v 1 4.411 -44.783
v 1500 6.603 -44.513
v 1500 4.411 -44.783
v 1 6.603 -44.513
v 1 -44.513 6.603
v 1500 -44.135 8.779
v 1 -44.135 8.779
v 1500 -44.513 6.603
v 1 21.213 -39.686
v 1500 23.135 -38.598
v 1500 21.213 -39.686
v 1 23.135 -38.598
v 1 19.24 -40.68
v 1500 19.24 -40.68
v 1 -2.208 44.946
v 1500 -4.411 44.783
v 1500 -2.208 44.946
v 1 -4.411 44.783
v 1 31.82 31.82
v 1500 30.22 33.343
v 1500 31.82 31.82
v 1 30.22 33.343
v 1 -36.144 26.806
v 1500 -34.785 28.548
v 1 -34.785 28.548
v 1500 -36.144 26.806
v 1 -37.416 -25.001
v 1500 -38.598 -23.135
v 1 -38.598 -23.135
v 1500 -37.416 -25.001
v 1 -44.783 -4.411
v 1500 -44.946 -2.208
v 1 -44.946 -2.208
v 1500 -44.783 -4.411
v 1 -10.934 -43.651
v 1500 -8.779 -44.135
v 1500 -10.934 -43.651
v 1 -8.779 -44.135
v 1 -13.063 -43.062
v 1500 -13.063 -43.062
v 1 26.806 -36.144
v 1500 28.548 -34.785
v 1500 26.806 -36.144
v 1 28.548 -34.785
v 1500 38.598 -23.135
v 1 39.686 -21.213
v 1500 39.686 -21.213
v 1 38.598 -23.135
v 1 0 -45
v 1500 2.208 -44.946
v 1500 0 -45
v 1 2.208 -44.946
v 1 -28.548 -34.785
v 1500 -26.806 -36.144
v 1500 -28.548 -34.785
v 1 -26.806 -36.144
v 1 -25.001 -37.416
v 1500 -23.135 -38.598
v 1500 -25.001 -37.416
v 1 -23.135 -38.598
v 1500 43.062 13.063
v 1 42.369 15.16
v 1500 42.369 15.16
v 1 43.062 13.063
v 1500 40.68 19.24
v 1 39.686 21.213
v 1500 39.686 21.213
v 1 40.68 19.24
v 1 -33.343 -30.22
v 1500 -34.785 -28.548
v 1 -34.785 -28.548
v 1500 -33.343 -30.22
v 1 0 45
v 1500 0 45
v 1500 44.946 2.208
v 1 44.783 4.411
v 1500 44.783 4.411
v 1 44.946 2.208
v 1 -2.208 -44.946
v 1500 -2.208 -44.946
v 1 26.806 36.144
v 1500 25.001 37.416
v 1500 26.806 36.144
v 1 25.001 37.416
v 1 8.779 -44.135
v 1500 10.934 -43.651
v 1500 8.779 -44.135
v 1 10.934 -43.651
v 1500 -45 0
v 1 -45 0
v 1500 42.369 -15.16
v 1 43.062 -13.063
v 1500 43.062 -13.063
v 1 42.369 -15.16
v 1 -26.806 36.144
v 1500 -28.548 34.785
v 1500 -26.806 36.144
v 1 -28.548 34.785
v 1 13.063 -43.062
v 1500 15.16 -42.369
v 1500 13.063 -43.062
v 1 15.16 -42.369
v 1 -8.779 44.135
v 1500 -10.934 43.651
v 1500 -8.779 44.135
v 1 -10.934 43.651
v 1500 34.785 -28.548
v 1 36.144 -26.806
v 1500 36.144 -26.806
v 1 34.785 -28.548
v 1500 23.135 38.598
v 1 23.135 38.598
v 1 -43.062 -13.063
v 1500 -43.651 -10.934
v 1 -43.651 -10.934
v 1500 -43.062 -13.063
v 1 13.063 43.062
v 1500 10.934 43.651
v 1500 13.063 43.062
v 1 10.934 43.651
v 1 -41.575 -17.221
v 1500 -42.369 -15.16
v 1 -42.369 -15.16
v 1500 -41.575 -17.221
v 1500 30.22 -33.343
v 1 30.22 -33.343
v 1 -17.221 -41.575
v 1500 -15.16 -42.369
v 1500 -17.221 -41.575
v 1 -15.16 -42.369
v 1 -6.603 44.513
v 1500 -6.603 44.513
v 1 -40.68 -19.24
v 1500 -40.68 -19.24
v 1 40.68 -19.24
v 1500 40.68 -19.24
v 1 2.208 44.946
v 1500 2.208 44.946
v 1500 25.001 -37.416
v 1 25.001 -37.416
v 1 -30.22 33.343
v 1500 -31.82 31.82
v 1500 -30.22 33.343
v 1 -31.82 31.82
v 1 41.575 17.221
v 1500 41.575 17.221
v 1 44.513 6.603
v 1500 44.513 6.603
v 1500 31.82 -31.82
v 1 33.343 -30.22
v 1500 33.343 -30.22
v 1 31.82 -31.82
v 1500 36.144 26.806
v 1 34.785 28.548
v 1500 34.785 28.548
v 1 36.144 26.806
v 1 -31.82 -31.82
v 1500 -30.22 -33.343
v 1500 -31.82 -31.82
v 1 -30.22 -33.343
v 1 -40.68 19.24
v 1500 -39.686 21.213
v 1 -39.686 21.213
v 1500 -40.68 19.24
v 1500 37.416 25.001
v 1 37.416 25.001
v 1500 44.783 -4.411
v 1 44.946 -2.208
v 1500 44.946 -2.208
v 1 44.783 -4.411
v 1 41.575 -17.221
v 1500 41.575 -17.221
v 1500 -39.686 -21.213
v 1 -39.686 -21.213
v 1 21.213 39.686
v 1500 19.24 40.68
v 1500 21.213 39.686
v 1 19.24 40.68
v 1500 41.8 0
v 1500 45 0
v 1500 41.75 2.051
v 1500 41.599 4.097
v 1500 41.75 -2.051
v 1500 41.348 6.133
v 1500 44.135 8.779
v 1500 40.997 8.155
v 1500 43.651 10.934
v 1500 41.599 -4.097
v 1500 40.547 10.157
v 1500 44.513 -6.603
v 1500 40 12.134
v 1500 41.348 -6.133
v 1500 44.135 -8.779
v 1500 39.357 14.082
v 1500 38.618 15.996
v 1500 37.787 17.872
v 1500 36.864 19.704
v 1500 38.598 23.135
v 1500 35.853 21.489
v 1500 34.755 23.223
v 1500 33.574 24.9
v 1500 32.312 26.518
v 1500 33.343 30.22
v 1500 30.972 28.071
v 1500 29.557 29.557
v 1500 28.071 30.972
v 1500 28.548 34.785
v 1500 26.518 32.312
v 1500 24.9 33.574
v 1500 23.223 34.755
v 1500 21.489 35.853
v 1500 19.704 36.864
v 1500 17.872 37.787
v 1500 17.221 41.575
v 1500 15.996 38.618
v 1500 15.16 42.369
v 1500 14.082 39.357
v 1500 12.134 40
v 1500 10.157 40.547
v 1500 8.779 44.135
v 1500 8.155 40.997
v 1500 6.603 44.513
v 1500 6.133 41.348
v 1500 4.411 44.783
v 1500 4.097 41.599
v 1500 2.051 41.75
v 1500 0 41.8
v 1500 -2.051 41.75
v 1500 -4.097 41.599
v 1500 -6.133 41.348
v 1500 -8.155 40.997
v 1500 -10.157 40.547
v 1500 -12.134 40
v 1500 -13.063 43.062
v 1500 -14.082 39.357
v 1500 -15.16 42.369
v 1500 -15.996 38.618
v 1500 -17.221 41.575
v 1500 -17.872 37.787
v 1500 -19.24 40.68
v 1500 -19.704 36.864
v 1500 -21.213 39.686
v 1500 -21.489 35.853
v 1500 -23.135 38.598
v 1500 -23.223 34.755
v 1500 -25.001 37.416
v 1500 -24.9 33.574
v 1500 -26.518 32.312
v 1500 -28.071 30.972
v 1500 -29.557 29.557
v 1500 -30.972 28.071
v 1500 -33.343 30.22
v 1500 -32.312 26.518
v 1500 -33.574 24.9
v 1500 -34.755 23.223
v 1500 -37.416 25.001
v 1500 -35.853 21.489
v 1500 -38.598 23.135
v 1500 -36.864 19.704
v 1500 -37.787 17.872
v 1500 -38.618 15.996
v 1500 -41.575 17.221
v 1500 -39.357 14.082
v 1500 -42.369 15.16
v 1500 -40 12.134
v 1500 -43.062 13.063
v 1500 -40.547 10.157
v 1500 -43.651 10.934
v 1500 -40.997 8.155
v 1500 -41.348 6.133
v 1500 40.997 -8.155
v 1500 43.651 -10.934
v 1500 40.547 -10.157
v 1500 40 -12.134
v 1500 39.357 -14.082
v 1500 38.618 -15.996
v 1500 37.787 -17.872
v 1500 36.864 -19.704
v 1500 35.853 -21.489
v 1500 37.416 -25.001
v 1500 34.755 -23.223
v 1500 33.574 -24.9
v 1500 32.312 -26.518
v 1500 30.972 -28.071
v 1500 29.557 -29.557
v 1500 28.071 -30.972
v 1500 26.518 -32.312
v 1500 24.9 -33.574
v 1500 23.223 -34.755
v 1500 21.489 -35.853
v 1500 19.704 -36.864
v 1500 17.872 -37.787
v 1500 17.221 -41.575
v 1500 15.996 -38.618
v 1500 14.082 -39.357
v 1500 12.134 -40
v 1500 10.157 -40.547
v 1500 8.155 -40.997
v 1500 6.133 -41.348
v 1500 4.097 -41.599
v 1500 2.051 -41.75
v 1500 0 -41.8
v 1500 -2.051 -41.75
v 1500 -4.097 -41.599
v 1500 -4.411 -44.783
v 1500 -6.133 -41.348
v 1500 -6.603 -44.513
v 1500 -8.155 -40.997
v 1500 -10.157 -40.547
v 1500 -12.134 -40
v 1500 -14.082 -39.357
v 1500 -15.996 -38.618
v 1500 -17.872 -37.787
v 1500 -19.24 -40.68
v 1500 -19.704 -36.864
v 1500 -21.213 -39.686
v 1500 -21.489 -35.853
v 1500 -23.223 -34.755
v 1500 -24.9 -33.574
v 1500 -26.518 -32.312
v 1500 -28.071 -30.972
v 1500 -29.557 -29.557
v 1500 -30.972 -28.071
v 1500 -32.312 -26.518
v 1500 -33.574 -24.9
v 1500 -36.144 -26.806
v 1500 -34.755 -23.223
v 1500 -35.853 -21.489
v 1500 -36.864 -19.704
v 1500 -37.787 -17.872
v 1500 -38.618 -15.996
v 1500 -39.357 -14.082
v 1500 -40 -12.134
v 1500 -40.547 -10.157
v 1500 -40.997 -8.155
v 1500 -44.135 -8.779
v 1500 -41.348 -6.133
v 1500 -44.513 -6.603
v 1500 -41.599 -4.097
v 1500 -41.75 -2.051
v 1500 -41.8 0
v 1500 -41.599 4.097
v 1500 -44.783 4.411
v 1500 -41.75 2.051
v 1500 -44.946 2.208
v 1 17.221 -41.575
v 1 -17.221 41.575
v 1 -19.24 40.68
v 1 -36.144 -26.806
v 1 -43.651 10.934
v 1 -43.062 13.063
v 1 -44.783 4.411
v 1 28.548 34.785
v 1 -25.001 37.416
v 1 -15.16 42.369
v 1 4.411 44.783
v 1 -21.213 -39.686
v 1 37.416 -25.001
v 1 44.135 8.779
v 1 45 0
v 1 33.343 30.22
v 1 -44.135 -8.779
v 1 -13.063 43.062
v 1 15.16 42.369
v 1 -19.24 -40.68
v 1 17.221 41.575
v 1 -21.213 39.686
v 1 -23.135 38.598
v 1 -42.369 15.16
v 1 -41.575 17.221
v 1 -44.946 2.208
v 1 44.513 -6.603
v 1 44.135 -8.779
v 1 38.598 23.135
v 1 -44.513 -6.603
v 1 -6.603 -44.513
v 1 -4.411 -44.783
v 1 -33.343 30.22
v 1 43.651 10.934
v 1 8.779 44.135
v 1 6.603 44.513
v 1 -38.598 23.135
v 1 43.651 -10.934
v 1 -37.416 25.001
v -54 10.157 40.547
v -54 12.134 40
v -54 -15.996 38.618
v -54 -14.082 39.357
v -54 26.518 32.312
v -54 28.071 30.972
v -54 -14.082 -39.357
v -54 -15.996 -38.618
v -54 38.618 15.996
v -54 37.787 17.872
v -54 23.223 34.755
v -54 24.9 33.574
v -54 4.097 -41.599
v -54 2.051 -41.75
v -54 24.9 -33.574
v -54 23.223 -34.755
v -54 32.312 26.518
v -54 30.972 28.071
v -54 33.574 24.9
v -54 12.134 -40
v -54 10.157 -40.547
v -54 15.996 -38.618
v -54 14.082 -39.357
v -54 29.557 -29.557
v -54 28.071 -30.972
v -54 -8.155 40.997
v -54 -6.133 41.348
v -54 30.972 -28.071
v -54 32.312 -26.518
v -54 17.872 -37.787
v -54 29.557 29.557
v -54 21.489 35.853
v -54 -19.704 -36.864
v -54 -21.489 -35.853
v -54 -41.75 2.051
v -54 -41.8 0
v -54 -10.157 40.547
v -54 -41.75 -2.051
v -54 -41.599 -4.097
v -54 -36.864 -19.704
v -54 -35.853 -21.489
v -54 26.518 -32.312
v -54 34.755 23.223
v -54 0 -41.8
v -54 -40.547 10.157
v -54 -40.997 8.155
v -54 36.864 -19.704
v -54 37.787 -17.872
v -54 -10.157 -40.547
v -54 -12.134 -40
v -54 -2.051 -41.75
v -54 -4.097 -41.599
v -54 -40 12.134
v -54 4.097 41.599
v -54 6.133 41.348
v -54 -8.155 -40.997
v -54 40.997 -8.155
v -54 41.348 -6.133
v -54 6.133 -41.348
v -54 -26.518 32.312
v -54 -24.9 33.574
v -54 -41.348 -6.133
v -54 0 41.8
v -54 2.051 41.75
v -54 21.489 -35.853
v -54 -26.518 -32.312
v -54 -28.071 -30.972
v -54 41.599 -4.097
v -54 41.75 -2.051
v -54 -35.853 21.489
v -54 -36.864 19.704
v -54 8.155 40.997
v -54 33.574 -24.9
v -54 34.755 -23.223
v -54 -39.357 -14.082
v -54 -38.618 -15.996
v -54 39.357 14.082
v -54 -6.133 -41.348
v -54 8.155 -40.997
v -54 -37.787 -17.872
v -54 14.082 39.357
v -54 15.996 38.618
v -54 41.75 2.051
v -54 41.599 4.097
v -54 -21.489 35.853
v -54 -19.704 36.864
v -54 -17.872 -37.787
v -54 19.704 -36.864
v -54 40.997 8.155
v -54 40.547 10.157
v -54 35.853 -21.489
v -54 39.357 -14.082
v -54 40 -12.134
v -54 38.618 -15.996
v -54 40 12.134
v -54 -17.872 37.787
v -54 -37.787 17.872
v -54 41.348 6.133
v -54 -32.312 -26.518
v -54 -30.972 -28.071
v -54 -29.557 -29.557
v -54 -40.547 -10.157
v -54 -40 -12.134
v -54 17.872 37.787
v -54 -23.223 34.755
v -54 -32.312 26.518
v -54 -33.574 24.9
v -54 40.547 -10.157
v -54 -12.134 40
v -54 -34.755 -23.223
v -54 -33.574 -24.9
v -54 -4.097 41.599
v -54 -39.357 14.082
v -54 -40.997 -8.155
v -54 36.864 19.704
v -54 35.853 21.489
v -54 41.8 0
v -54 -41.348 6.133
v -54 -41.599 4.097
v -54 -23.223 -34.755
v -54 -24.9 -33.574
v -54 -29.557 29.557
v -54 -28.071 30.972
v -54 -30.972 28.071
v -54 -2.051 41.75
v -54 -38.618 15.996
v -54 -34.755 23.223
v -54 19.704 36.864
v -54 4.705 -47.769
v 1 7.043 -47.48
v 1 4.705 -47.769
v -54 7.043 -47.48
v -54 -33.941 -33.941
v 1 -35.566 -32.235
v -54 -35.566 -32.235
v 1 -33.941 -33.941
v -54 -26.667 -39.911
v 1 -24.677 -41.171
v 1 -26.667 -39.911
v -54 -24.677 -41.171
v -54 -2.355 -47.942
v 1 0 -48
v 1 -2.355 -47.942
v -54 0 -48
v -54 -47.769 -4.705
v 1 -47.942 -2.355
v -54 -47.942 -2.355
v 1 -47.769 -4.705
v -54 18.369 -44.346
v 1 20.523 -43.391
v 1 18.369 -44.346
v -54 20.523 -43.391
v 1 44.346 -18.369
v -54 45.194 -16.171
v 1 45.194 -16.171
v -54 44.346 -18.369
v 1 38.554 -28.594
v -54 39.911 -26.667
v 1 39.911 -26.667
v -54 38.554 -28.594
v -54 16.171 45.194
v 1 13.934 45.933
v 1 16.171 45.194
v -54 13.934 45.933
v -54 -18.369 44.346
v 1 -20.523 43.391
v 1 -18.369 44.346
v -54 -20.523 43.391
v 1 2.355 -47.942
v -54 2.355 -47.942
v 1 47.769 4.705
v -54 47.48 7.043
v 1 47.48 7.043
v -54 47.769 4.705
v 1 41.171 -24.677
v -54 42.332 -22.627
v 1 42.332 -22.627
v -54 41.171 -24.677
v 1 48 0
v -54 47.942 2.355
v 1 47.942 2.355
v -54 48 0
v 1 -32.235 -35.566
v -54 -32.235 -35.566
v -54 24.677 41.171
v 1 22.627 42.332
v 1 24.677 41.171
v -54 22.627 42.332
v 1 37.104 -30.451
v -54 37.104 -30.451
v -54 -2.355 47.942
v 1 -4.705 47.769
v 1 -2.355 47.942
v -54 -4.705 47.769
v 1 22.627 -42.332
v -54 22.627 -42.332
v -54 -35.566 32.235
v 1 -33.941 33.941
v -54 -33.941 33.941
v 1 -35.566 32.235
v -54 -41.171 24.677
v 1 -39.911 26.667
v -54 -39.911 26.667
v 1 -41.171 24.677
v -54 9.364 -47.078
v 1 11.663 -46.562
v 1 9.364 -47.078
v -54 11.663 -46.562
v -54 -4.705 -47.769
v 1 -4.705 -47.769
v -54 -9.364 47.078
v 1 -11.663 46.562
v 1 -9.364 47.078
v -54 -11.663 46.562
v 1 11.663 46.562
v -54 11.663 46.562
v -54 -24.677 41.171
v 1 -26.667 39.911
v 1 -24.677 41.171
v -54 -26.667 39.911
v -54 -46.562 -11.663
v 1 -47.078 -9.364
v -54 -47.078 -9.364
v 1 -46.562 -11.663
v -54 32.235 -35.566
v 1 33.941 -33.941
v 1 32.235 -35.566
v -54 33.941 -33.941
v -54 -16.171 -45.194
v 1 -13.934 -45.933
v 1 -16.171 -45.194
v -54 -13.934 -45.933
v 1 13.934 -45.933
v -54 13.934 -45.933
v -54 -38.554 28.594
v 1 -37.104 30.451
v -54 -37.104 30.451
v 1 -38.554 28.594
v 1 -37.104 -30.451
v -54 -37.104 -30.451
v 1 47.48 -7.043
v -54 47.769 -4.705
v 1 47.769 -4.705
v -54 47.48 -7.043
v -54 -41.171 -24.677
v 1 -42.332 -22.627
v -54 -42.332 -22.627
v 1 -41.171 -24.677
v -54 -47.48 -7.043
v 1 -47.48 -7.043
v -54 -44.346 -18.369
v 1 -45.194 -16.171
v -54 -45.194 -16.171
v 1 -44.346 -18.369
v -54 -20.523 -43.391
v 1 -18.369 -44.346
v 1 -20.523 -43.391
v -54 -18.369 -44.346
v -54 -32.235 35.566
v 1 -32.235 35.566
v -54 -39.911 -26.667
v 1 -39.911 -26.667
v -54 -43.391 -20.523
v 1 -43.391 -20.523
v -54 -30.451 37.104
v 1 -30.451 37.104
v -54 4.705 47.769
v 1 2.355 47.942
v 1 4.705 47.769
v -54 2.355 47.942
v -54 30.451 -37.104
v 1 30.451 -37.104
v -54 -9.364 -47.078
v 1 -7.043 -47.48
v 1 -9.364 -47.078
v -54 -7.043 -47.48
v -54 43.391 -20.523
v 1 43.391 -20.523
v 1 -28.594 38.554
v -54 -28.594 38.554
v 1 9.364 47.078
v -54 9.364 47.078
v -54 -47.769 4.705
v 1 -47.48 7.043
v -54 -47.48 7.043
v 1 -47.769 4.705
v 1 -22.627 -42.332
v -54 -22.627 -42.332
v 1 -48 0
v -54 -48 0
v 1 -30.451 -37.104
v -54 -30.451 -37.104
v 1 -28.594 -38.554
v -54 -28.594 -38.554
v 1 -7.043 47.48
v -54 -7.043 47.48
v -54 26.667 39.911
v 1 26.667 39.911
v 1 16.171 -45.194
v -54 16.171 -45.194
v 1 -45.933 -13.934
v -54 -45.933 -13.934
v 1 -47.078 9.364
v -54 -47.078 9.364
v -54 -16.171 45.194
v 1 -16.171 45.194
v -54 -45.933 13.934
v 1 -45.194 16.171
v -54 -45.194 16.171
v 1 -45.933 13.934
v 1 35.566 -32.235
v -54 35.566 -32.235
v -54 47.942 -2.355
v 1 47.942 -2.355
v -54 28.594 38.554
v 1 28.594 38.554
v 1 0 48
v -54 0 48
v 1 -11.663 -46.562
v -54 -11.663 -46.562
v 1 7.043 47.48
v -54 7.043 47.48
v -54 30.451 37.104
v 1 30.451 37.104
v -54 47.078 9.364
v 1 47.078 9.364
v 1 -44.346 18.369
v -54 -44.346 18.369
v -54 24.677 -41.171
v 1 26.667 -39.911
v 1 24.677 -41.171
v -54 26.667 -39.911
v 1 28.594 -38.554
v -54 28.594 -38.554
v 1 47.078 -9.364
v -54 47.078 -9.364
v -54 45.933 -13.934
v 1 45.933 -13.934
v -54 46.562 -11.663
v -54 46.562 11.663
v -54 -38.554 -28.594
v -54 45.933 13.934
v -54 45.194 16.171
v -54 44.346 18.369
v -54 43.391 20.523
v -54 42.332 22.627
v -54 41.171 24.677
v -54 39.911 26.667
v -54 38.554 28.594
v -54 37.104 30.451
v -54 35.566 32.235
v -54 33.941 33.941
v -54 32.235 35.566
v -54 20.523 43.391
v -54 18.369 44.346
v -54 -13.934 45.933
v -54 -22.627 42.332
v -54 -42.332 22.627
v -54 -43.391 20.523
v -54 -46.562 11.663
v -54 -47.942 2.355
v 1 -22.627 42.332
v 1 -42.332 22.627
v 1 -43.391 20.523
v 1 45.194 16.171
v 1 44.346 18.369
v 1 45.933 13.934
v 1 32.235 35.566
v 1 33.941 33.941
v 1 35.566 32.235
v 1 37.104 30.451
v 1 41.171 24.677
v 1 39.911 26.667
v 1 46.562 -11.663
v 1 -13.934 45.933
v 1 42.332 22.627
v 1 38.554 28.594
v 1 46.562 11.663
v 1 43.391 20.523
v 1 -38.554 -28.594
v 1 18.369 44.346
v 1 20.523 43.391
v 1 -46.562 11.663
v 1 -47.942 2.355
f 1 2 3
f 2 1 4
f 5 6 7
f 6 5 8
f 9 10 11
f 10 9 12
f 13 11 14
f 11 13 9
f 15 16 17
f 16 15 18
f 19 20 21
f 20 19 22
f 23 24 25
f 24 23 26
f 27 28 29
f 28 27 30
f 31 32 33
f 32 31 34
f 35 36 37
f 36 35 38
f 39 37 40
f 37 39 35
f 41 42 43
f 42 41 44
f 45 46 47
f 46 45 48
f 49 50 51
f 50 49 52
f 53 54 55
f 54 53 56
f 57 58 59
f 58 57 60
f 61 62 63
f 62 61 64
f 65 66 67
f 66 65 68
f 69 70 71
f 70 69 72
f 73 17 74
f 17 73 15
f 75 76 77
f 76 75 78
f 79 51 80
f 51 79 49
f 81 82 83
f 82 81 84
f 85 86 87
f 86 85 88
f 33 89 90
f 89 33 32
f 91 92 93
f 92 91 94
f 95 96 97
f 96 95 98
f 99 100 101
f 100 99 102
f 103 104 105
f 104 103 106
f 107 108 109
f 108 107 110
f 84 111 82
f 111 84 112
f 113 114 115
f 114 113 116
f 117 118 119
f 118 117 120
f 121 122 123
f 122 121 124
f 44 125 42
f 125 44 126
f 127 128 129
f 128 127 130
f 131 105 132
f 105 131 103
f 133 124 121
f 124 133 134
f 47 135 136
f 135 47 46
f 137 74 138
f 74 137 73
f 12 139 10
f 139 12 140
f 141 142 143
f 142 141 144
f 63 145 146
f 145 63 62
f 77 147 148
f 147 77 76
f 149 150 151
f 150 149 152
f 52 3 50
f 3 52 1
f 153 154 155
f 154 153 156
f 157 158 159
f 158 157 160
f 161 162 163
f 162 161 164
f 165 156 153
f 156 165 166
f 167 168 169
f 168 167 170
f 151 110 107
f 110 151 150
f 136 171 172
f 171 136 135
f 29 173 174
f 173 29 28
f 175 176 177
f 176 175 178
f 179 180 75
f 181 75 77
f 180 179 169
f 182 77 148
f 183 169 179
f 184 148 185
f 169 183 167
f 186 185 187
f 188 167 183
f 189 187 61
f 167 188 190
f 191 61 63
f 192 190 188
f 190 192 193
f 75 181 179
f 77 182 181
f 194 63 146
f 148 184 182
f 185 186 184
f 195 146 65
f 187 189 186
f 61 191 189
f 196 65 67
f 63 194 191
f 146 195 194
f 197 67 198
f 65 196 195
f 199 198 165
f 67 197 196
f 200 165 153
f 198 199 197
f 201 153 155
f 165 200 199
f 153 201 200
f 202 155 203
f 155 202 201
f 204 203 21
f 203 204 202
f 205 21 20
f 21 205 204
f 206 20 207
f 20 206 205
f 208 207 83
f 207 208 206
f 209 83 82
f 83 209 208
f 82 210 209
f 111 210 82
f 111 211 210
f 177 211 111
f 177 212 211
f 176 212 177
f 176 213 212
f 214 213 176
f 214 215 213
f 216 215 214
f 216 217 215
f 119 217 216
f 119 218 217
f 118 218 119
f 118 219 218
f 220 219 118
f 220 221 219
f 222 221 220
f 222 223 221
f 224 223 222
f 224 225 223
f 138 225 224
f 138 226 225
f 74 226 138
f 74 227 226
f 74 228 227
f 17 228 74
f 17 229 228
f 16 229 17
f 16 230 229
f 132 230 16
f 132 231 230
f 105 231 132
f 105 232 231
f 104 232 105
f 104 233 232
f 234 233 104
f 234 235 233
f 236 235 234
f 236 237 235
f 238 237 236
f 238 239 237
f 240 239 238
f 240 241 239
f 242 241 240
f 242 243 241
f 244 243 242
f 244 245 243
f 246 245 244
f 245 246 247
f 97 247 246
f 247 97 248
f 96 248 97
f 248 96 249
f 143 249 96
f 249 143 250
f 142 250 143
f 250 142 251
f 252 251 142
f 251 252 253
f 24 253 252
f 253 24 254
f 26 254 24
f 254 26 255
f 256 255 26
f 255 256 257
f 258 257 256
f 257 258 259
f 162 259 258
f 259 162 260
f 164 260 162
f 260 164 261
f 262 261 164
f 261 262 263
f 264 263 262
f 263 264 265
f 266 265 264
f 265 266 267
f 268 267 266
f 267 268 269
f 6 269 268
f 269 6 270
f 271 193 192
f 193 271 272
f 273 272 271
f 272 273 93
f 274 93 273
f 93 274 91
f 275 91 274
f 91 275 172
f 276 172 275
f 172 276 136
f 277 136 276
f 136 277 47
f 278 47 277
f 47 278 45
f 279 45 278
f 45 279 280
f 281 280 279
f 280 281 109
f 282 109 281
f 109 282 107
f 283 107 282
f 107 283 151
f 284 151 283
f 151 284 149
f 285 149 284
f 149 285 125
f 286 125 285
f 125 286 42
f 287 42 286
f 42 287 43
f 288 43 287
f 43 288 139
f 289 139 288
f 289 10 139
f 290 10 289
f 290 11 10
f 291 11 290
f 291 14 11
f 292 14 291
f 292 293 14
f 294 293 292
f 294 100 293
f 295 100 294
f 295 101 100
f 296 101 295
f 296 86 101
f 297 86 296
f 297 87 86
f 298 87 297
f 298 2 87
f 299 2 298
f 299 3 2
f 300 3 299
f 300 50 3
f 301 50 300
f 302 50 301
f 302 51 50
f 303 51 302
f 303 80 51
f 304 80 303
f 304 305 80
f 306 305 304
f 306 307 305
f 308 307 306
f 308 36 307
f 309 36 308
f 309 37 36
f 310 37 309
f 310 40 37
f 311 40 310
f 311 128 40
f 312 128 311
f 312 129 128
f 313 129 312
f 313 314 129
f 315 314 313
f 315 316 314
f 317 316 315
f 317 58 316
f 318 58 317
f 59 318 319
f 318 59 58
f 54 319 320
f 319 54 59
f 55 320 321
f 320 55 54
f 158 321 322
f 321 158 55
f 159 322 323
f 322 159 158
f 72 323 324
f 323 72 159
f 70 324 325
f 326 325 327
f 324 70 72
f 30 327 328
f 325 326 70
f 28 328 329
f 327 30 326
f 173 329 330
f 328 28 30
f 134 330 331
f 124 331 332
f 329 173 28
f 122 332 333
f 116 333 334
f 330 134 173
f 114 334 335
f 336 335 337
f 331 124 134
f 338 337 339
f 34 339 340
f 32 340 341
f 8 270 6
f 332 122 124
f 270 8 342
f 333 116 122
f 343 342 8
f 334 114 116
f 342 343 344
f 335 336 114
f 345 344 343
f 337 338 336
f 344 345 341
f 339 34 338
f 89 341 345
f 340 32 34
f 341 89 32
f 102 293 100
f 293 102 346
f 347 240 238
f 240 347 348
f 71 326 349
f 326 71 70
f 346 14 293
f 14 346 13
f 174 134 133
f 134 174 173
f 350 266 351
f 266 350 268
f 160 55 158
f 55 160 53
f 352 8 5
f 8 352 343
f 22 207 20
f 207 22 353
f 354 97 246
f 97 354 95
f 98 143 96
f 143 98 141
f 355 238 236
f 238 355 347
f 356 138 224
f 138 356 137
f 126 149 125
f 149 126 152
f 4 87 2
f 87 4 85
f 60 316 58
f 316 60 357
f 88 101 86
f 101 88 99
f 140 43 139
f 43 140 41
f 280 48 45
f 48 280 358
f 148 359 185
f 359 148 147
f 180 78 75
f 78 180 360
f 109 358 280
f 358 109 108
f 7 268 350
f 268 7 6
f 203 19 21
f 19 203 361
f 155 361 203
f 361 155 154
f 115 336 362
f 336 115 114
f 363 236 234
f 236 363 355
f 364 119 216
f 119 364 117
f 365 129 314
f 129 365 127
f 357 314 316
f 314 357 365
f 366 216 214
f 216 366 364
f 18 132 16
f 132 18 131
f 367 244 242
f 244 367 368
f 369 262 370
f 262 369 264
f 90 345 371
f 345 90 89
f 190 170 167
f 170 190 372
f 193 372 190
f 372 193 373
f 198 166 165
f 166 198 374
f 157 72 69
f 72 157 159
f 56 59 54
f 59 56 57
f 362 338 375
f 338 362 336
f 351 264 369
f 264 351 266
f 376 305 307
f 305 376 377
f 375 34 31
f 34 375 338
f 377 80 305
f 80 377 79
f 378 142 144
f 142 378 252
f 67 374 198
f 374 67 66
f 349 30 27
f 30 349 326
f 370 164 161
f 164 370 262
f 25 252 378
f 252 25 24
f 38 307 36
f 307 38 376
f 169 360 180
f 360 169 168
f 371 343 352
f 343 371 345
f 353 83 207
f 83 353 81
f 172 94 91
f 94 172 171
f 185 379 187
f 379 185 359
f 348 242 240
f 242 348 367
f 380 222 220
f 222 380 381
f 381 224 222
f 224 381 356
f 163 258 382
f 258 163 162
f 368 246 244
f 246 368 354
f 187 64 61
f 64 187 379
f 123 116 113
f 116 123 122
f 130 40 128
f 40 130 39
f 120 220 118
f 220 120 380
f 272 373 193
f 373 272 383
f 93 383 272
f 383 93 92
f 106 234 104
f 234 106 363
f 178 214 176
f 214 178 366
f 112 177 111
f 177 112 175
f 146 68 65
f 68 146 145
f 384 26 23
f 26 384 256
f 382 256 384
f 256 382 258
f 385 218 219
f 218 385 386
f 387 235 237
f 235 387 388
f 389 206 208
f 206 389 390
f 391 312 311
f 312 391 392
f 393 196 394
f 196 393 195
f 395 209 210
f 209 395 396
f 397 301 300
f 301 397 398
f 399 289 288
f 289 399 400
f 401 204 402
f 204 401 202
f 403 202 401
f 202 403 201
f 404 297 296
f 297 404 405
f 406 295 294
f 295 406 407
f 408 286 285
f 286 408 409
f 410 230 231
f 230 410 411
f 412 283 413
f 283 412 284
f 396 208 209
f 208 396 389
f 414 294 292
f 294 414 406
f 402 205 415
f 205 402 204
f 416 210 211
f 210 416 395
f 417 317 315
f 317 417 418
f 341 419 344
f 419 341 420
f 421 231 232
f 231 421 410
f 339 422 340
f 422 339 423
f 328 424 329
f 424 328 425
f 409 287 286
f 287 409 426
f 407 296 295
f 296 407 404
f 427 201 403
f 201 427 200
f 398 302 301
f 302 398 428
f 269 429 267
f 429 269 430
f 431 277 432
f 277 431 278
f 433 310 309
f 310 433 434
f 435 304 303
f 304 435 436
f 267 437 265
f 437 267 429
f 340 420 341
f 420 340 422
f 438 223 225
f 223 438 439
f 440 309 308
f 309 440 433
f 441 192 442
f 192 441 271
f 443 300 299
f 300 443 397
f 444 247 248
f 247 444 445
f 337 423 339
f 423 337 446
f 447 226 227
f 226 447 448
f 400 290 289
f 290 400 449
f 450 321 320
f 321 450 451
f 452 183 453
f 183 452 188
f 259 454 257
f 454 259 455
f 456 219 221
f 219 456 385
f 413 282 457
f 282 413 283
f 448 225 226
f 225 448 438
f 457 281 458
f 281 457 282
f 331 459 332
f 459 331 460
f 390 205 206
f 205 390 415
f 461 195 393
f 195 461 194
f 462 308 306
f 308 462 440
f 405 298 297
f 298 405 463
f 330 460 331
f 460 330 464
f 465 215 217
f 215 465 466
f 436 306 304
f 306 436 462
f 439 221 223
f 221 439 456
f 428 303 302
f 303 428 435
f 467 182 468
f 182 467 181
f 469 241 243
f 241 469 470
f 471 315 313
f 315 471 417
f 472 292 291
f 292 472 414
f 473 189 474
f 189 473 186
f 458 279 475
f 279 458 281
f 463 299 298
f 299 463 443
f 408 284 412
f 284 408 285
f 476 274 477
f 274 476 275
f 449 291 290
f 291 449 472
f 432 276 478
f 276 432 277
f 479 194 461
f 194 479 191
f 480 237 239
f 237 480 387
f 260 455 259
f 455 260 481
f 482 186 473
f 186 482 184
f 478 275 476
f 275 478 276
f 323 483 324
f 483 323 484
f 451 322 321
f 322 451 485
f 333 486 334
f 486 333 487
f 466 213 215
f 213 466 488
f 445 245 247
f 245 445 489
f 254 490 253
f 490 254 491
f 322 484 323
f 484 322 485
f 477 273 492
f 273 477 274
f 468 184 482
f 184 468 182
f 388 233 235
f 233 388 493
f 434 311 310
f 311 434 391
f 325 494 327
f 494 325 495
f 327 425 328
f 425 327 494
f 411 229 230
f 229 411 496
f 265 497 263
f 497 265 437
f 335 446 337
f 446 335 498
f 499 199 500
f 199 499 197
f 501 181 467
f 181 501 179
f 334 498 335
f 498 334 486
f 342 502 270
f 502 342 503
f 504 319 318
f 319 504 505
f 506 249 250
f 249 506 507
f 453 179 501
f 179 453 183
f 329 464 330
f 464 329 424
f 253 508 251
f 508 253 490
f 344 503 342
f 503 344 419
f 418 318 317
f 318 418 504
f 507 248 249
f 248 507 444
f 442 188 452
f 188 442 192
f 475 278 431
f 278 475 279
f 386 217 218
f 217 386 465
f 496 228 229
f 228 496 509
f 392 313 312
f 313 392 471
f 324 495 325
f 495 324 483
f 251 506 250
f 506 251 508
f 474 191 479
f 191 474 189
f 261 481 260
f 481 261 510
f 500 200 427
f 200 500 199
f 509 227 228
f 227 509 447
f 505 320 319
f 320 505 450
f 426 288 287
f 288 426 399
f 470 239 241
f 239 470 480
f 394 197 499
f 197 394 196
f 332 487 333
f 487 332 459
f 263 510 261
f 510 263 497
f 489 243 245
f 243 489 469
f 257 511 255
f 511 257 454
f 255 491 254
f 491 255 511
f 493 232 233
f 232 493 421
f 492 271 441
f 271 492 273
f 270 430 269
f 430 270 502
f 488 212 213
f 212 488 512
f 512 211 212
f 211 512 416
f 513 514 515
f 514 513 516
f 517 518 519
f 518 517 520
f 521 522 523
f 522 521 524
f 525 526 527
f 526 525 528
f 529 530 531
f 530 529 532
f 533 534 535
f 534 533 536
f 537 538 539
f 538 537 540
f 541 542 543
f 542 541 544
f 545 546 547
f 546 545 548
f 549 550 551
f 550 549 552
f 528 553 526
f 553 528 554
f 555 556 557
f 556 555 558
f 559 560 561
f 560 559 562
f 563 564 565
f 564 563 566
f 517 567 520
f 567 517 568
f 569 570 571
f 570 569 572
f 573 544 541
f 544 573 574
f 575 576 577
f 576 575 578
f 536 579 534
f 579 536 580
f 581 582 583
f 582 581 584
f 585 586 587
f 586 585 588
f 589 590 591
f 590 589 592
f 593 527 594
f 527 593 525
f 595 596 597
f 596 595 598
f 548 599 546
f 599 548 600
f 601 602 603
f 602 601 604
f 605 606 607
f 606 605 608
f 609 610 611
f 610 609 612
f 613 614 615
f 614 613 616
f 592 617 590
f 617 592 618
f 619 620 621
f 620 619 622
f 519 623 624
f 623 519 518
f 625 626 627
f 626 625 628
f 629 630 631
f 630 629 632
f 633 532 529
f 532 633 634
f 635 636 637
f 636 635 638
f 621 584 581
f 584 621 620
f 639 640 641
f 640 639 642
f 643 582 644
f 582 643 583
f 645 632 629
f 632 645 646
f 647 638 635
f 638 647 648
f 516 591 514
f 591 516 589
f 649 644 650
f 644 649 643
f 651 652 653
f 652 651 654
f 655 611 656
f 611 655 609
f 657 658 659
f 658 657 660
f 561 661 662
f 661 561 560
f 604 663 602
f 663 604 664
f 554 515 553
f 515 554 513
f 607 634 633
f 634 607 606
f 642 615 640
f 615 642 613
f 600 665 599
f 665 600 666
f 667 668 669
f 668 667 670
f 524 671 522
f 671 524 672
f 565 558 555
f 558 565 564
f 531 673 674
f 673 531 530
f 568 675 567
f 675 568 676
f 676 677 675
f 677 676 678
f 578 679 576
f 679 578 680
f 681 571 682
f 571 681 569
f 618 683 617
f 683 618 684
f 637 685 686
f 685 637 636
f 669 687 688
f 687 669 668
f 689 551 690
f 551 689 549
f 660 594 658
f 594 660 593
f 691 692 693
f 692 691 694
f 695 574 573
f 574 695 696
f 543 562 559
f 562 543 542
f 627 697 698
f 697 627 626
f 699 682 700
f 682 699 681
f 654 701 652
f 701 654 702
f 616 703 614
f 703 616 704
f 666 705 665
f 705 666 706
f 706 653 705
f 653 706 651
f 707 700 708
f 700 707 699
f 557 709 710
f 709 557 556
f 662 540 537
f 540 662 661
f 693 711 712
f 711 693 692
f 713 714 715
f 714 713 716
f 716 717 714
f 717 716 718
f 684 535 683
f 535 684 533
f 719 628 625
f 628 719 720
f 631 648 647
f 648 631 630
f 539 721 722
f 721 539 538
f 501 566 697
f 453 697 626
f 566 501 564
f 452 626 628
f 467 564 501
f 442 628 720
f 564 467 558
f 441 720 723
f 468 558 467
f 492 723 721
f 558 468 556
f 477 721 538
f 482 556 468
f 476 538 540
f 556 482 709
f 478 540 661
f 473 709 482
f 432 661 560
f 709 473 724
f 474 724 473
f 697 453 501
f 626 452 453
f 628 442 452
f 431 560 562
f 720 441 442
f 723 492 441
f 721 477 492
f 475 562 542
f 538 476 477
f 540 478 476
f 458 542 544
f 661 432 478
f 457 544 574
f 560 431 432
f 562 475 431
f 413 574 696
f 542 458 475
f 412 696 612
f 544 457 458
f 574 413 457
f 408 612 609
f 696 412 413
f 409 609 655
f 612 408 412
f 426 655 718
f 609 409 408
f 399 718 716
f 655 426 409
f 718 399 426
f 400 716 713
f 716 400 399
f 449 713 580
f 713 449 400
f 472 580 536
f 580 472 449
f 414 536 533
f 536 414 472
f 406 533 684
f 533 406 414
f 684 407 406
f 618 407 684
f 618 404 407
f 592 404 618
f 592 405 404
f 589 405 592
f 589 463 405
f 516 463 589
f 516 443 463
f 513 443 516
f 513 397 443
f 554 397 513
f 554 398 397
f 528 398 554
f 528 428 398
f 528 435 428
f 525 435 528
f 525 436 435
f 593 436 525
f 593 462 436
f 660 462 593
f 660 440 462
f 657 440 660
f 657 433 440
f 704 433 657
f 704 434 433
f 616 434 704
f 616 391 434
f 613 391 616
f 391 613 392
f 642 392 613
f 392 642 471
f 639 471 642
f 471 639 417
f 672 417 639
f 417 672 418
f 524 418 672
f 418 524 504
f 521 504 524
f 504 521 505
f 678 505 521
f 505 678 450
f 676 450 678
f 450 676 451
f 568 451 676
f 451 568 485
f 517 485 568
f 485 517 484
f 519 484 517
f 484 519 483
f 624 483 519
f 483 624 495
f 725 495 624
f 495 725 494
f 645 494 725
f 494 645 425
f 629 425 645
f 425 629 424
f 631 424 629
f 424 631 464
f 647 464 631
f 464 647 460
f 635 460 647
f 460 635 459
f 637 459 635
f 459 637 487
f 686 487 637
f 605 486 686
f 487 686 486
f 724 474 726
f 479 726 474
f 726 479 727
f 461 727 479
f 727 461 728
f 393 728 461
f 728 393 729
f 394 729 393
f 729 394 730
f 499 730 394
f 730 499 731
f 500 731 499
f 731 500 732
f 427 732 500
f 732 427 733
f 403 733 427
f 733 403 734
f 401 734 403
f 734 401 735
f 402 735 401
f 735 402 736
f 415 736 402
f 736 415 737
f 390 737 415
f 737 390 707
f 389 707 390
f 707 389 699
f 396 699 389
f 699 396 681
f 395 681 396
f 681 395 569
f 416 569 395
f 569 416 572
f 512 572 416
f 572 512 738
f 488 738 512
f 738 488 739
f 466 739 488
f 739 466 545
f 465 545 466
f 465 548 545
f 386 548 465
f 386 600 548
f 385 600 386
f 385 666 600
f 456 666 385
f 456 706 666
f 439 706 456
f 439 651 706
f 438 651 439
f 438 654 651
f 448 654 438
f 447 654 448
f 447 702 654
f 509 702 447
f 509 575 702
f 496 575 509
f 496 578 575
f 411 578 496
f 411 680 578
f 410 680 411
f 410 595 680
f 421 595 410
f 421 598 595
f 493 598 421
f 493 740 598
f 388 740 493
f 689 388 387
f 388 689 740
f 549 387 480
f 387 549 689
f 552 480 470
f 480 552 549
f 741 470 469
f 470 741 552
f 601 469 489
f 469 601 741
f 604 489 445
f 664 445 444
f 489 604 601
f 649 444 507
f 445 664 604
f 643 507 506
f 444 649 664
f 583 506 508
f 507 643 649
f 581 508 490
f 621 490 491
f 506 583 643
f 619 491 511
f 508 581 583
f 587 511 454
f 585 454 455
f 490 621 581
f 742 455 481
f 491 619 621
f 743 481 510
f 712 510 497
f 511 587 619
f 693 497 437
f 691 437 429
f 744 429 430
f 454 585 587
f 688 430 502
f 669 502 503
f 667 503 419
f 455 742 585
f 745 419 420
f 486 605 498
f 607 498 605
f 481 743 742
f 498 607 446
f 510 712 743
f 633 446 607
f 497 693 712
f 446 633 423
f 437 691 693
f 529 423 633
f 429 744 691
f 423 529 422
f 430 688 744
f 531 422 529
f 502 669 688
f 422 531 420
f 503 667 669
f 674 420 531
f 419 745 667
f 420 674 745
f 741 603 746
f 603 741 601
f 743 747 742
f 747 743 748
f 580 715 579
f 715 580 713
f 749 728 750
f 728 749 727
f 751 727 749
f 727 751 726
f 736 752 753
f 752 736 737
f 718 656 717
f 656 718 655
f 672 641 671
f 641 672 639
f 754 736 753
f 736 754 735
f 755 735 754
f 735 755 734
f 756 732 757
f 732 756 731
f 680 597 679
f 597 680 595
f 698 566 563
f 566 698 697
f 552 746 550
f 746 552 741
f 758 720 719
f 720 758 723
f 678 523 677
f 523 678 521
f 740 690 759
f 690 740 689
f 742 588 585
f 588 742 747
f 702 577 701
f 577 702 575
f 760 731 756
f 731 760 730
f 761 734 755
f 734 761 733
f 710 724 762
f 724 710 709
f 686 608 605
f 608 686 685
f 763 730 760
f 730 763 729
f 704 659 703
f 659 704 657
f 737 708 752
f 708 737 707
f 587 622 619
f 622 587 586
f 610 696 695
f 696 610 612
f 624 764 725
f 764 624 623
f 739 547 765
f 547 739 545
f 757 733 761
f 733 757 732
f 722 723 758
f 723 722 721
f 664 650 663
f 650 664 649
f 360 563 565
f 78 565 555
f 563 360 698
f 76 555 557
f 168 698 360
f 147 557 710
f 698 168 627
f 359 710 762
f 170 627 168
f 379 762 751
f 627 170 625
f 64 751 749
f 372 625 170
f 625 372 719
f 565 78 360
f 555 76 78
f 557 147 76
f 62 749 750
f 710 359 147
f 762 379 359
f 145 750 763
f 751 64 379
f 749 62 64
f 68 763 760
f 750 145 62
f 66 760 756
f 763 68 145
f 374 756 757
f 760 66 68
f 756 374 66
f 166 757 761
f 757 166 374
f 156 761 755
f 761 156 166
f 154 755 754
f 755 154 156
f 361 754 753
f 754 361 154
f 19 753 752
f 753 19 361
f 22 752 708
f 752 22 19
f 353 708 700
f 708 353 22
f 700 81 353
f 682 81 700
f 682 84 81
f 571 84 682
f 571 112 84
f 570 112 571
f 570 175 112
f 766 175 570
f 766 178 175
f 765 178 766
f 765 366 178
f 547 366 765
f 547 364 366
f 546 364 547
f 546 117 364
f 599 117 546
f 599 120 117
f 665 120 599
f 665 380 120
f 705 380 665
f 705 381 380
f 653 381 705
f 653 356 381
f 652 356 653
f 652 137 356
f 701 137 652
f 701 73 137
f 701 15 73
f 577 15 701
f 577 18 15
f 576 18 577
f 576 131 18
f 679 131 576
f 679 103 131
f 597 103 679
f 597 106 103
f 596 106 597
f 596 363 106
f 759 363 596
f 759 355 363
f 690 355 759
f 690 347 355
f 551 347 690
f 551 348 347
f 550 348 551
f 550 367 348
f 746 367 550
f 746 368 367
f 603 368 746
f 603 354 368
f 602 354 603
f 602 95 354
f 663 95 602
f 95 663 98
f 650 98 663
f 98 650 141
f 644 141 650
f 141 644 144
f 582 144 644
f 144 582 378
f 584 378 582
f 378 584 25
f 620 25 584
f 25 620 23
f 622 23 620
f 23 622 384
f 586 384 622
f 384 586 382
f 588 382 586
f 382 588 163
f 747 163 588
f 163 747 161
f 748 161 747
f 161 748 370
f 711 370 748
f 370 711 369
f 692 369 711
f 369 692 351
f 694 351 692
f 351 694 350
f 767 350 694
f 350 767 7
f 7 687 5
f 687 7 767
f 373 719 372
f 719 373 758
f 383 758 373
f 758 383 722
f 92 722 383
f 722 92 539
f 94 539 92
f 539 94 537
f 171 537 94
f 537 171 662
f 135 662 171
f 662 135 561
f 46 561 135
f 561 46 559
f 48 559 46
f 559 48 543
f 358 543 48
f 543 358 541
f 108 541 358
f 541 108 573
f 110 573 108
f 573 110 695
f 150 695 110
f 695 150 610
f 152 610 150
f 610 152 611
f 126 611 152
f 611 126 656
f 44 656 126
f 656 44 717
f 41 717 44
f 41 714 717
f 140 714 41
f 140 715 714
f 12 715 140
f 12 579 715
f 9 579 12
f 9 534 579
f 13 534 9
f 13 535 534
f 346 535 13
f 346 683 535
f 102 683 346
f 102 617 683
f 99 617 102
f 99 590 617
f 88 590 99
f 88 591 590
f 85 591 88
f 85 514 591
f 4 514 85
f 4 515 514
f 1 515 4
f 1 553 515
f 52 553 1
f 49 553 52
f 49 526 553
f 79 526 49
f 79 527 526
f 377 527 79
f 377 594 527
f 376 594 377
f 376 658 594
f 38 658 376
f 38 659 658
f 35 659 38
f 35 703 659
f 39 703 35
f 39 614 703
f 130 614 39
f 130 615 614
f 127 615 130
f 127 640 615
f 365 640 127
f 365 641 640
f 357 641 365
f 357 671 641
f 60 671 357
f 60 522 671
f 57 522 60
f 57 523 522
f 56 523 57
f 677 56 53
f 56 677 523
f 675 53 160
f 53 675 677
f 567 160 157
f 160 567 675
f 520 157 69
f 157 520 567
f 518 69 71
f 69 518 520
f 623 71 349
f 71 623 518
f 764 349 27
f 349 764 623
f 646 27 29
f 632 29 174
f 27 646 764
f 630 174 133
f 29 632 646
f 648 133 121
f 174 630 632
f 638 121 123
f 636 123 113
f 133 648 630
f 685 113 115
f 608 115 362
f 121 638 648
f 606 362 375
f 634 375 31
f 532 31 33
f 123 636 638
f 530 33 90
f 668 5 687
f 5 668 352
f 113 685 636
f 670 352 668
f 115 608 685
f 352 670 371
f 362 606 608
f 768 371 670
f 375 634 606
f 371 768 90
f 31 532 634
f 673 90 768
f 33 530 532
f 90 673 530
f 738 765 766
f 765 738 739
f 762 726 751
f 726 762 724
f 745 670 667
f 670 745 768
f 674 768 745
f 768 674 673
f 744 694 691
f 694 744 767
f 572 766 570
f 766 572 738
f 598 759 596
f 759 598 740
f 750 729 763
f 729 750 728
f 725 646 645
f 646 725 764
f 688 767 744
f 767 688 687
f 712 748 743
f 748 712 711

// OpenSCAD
$fn = 128;

// Parameters (HT straight pipe)
nominal_diameter_mm = 90; //[45:180:1]
length_mm = 1500; //[750:3000:10]          // total straight length
pipe_wall_mm = 3.2; //[1.6:6.4:0.1]

// Optional socket end fitting(s)
include_end_fitting = 1; //[0:1:1]
end_fitting_count = 1; //[0:2:1]           // 0,1,2 sockets
fitting_length_mm = 55; //[30:110:1]
fitting_over_od_mm = 6; //[3:12:0.5]
fitting_overlap_mm = 1; //[0.5:2:0.1]

// Derived radii
od_r = nominal_diameter_mm/2;
id_r = max(0.01, od_r - pipe_wall_mm);

socket_od_r = od_r + fitting_over_od_mm/2;
socket_id_r = id_r;

// Small overlap to guarantee manifold unions
eps = 0.5;

// Straight hollow pipe along +X, starting at x=0
module straight_pipe_x(len, outer_r, inner_r) {
    difference() {
        translate([len/2, 0, 0]) rotate([0,90,0]) cylinder(h=len, r=outer_r, center=true);
        translate([len/2, 0, 0]) rotate([0,90,0]) cylinder(h=len + 2*eps, r=inner_r, center=true);
    }
}

// Socket along +X, starting at x=0
module socket_x(len, outer_r, inner_r) {
    difference() {
        translate([len/2, 0, 0]) rotate([0,90,0]) cylinder(h=len, r=outer_r, center=true);
        translate([len/2, 0, 0]) rotate([0,90,0]) cylinder(h=len + 2*eps, r=inner_r, center=true);
    }
}

// Main HT straight pipe (one connected solid)
module ht_straight_pipe() {
    color([0.85, 0.85, 0.8])
    union() {
        // Main pipe body: exact length_mm
        straight_pipe_x(length_mm, od_r, id_r);

        // End fittings (sockets), connected with calculated placement + overlap
        if (include_end_fitting && end_fitting_count > 0) {
            // Socket on left end (x=0), extends outward to -X
            translate([-fitting_length_mm + fitting_overlap_mm, 0, 0])
                socket_x(fitting_length_mm, socket_od_r, socket_id_r);
        }
        if (include_end_fitting && end_fitting_count > 1) {
            // Socket on right end (x=length_mm), extends outward to +X
            translate([length_mm - fitting_overlap_mm, 0, 0])
                socket_x(fitting_length_mm, socket_od_r, socket_id_r);
        }
    }
}

ht_straight_pipe();
